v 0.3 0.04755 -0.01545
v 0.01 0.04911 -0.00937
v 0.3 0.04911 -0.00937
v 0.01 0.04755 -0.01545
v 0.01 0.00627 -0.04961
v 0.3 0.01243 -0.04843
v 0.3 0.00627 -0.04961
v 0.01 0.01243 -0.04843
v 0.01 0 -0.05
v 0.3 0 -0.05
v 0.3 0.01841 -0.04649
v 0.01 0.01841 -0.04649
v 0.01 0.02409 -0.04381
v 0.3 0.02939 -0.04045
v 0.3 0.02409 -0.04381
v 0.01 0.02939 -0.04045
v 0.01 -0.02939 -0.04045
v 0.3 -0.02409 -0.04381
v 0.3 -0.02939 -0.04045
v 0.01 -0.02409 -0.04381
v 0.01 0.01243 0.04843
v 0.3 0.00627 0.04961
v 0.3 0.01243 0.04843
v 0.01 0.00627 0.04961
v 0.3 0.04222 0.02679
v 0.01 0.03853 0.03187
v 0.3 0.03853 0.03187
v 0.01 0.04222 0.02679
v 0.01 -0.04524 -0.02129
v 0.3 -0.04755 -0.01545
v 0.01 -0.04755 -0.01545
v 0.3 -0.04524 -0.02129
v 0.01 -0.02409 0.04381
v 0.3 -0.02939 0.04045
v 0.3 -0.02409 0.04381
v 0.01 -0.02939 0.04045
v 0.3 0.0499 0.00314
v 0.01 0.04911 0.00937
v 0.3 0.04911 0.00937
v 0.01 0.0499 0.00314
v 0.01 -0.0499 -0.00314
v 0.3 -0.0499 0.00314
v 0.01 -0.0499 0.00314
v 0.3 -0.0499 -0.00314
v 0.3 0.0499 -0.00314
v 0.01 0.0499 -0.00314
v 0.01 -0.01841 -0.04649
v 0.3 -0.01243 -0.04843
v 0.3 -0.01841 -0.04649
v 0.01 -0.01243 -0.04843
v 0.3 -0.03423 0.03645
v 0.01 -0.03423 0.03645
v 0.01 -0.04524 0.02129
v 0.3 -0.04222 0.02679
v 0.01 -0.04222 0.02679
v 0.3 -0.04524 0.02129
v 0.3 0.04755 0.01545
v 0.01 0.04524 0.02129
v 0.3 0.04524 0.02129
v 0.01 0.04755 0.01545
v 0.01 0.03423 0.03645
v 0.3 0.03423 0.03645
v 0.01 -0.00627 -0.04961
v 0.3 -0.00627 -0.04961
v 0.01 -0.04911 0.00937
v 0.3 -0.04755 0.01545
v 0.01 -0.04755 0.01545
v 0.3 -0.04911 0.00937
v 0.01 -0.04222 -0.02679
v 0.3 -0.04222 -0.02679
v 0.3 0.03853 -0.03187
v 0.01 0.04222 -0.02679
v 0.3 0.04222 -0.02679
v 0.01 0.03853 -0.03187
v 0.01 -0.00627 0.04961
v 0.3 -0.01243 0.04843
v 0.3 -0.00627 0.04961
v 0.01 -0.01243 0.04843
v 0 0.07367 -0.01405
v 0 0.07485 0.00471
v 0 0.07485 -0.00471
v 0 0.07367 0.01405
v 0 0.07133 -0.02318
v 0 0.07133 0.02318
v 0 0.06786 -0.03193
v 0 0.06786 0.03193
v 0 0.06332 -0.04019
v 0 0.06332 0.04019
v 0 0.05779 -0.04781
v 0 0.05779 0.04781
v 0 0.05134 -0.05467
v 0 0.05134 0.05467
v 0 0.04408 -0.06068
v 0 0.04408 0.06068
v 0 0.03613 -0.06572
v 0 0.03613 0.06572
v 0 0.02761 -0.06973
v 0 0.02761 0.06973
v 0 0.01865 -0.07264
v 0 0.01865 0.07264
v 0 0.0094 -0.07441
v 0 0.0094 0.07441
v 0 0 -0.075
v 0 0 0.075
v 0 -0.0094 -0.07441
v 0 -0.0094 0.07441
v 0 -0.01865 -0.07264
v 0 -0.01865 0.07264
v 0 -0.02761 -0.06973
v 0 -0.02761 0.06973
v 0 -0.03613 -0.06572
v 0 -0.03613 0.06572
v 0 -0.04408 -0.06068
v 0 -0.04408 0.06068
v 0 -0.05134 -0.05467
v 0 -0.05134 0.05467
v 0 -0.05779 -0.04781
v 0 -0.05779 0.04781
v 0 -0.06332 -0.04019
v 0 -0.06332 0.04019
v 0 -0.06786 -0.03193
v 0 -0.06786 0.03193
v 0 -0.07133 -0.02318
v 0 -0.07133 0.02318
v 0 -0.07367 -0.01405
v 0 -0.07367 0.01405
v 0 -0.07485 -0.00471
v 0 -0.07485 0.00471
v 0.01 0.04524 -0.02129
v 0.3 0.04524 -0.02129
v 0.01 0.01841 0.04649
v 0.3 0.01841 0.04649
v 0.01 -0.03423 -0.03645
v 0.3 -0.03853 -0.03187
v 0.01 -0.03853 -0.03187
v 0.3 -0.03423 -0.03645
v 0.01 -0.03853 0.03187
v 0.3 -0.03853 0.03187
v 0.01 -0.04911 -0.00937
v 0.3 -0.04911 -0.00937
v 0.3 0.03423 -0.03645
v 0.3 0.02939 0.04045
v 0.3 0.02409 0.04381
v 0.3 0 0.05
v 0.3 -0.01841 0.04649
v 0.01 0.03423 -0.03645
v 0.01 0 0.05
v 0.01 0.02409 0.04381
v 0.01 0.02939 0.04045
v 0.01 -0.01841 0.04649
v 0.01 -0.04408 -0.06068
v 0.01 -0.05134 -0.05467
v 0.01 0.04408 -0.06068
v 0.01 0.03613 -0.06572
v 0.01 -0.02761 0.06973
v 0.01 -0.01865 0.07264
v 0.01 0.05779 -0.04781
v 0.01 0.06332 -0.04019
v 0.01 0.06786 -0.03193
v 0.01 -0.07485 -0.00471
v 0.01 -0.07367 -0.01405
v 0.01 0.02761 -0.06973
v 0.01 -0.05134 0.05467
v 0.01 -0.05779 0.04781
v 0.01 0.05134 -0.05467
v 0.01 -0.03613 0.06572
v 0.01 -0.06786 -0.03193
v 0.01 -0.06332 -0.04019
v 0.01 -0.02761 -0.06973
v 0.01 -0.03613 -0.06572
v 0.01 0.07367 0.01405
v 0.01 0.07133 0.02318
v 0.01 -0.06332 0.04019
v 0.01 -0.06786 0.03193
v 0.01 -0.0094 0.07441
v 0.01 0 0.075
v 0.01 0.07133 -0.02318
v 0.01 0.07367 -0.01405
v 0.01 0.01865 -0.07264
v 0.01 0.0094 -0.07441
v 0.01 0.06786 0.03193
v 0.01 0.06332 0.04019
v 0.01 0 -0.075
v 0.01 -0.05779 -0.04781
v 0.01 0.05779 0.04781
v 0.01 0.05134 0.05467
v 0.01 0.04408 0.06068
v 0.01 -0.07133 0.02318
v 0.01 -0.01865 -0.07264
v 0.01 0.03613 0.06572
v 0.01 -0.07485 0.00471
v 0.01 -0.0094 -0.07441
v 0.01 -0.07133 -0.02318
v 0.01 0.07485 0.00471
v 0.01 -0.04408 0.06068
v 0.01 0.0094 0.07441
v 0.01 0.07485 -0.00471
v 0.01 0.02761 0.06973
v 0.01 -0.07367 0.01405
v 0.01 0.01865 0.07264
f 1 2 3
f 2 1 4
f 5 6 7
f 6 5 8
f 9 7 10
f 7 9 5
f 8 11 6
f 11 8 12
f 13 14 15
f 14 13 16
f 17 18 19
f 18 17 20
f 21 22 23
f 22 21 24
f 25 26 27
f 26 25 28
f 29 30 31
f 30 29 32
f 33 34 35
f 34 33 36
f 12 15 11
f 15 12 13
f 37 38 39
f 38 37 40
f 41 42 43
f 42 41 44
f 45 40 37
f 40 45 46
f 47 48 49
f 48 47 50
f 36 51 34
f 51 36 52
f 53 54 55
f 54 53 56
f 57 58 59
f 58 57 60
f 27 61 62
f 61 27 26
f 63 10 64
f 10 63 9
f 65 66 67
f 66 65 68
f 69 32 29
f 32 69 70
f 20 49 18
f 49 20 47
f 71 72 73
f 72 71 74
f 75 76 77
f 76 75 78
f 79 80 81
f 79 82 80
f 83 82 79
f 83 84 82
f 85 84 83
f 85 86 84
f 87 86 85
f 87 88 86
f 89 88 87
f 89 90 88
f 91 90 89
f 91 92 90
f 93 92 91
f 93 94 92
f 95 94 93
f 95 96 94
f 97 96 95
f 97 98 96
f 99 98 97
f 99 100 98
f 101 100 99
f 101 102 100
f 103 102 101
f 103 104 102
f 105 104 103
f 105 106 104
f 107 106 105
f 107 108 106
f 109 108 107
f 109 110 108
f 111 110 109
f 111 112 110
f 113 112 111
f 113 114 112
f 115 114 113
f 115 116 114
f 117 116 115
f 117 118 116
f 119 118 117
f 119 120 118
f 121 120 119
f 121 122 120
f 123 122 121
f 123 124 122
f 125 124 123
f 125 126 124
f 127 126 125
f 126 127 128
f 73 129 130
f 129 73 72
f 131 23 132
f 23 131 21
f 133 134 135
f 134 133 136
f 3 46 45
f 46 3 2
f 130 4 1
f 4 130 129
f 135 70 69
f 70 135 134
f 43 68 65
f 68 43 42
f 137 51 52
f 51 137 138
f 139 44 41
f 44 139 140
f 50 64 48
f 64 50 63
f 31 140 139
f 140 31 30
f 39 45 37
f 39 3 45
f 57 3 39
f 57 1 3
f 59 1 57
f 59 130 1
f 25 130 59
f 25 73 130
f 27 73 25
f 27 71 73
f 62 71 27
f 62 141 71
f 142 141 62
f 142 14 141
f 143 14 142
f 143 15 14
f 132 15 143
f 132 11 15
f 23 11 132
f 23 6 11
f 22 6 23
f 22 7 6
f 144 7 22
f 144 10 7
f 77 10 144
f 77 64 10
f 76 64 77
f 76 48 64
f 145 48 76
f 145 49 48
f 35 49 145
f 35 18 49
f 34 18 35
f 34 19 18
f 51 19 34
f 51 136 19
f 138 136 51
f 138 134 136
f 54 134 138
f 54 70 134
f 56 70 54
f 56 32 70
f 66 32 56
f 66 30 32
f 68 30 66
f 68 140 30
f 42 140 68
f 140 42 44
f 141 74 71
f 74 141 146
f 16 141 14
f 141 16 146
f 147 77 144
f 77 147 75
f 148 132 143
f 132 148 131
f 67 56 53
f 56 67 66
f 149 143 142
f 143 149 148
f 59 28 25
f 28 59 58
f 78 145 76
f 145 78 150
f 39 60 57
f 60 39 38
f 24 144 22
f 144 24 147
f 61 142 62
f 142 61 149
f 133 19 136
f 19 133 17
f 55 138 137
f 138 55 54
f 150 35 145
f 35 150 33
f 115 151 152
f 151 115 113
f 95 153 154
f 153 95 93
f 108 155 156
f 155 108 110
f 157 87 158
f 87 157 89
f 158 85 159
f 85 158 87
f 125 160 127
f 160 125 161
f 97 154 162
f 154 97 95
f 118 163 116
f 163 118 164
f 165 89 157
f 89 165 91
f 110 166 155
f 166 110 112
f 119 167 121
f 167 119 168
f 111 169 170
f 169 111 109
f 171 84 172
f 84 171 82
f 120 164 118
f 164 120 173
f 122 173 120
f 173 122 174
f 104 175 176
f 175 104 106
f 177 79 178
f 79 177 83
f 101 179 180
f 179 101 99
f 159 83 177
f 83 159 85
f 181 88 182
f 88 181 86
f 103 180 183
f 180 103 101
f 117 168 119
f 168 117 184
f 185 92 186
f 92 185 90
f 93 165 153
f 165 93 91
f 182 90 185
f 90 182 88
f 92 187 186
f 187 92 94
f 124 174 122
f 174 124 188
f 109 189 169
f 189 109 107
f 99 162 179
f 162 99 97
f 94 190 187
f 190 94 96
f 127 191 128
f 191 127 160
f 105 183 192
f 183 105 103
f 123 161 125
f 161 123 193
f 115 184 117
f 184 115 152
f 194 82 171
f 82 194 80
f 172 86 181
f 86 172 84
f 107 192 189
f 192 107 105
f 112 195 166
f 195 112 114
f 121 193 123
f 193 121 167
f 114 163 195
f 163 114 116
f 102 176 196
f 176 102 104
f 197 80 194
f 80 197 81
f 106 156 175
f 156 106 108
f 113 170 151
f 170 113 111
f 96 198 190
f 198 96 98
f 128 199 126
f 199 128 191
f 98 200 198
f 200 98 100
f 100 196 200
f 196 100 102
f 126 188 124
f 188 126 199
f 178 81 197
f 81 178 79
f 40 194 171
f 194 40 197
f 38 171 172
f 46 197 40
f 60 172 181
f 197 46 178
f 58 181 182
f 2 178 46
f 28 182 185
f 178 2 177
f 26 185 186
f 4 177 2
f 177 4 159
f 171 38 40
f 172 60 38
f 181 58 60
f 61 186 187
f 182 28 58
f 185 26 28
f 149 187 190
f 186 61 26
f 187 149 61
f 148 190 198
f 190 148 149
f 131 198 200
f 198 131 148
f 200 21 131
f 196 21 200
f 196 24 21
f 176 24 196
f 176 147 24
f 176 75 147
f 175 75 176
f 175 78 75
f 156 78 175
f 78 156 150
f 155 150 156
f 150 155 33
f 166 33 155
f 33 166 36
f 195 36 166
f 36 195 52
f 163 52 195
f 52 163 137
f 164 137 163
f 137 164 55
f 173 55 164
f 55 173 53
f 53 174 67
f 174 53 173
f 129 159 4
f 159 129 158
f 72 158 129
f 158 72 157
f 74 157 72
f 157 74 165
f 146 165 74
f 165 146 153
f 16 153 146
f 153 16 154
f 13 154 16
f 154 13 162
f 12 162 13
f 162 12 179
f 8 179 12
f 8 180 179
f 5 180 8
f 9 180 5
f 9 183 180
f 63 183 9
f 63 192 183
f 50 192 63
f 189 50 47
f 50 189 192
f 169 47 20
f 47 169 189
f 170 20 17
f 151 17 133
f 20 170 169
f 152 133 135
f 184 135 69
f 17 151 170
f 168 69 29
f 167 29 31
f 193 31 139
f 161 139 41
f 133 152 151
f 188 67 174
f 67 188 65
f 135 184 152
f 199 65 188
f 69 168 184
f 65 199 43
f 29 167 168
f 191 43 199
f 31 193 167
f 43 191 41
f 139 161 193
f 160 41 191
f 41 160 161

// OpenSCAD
$fn=50;  // REMOVE
LENGTH = 0.3;  // REMOVE
DO = 0.1; // REMOVE
rotate([0,90,0]) { cylinder(h=(LENGTH), r=(DO)/2); cylinder(h=(DO)*0.1, r=(DO)*1.5/2); }
